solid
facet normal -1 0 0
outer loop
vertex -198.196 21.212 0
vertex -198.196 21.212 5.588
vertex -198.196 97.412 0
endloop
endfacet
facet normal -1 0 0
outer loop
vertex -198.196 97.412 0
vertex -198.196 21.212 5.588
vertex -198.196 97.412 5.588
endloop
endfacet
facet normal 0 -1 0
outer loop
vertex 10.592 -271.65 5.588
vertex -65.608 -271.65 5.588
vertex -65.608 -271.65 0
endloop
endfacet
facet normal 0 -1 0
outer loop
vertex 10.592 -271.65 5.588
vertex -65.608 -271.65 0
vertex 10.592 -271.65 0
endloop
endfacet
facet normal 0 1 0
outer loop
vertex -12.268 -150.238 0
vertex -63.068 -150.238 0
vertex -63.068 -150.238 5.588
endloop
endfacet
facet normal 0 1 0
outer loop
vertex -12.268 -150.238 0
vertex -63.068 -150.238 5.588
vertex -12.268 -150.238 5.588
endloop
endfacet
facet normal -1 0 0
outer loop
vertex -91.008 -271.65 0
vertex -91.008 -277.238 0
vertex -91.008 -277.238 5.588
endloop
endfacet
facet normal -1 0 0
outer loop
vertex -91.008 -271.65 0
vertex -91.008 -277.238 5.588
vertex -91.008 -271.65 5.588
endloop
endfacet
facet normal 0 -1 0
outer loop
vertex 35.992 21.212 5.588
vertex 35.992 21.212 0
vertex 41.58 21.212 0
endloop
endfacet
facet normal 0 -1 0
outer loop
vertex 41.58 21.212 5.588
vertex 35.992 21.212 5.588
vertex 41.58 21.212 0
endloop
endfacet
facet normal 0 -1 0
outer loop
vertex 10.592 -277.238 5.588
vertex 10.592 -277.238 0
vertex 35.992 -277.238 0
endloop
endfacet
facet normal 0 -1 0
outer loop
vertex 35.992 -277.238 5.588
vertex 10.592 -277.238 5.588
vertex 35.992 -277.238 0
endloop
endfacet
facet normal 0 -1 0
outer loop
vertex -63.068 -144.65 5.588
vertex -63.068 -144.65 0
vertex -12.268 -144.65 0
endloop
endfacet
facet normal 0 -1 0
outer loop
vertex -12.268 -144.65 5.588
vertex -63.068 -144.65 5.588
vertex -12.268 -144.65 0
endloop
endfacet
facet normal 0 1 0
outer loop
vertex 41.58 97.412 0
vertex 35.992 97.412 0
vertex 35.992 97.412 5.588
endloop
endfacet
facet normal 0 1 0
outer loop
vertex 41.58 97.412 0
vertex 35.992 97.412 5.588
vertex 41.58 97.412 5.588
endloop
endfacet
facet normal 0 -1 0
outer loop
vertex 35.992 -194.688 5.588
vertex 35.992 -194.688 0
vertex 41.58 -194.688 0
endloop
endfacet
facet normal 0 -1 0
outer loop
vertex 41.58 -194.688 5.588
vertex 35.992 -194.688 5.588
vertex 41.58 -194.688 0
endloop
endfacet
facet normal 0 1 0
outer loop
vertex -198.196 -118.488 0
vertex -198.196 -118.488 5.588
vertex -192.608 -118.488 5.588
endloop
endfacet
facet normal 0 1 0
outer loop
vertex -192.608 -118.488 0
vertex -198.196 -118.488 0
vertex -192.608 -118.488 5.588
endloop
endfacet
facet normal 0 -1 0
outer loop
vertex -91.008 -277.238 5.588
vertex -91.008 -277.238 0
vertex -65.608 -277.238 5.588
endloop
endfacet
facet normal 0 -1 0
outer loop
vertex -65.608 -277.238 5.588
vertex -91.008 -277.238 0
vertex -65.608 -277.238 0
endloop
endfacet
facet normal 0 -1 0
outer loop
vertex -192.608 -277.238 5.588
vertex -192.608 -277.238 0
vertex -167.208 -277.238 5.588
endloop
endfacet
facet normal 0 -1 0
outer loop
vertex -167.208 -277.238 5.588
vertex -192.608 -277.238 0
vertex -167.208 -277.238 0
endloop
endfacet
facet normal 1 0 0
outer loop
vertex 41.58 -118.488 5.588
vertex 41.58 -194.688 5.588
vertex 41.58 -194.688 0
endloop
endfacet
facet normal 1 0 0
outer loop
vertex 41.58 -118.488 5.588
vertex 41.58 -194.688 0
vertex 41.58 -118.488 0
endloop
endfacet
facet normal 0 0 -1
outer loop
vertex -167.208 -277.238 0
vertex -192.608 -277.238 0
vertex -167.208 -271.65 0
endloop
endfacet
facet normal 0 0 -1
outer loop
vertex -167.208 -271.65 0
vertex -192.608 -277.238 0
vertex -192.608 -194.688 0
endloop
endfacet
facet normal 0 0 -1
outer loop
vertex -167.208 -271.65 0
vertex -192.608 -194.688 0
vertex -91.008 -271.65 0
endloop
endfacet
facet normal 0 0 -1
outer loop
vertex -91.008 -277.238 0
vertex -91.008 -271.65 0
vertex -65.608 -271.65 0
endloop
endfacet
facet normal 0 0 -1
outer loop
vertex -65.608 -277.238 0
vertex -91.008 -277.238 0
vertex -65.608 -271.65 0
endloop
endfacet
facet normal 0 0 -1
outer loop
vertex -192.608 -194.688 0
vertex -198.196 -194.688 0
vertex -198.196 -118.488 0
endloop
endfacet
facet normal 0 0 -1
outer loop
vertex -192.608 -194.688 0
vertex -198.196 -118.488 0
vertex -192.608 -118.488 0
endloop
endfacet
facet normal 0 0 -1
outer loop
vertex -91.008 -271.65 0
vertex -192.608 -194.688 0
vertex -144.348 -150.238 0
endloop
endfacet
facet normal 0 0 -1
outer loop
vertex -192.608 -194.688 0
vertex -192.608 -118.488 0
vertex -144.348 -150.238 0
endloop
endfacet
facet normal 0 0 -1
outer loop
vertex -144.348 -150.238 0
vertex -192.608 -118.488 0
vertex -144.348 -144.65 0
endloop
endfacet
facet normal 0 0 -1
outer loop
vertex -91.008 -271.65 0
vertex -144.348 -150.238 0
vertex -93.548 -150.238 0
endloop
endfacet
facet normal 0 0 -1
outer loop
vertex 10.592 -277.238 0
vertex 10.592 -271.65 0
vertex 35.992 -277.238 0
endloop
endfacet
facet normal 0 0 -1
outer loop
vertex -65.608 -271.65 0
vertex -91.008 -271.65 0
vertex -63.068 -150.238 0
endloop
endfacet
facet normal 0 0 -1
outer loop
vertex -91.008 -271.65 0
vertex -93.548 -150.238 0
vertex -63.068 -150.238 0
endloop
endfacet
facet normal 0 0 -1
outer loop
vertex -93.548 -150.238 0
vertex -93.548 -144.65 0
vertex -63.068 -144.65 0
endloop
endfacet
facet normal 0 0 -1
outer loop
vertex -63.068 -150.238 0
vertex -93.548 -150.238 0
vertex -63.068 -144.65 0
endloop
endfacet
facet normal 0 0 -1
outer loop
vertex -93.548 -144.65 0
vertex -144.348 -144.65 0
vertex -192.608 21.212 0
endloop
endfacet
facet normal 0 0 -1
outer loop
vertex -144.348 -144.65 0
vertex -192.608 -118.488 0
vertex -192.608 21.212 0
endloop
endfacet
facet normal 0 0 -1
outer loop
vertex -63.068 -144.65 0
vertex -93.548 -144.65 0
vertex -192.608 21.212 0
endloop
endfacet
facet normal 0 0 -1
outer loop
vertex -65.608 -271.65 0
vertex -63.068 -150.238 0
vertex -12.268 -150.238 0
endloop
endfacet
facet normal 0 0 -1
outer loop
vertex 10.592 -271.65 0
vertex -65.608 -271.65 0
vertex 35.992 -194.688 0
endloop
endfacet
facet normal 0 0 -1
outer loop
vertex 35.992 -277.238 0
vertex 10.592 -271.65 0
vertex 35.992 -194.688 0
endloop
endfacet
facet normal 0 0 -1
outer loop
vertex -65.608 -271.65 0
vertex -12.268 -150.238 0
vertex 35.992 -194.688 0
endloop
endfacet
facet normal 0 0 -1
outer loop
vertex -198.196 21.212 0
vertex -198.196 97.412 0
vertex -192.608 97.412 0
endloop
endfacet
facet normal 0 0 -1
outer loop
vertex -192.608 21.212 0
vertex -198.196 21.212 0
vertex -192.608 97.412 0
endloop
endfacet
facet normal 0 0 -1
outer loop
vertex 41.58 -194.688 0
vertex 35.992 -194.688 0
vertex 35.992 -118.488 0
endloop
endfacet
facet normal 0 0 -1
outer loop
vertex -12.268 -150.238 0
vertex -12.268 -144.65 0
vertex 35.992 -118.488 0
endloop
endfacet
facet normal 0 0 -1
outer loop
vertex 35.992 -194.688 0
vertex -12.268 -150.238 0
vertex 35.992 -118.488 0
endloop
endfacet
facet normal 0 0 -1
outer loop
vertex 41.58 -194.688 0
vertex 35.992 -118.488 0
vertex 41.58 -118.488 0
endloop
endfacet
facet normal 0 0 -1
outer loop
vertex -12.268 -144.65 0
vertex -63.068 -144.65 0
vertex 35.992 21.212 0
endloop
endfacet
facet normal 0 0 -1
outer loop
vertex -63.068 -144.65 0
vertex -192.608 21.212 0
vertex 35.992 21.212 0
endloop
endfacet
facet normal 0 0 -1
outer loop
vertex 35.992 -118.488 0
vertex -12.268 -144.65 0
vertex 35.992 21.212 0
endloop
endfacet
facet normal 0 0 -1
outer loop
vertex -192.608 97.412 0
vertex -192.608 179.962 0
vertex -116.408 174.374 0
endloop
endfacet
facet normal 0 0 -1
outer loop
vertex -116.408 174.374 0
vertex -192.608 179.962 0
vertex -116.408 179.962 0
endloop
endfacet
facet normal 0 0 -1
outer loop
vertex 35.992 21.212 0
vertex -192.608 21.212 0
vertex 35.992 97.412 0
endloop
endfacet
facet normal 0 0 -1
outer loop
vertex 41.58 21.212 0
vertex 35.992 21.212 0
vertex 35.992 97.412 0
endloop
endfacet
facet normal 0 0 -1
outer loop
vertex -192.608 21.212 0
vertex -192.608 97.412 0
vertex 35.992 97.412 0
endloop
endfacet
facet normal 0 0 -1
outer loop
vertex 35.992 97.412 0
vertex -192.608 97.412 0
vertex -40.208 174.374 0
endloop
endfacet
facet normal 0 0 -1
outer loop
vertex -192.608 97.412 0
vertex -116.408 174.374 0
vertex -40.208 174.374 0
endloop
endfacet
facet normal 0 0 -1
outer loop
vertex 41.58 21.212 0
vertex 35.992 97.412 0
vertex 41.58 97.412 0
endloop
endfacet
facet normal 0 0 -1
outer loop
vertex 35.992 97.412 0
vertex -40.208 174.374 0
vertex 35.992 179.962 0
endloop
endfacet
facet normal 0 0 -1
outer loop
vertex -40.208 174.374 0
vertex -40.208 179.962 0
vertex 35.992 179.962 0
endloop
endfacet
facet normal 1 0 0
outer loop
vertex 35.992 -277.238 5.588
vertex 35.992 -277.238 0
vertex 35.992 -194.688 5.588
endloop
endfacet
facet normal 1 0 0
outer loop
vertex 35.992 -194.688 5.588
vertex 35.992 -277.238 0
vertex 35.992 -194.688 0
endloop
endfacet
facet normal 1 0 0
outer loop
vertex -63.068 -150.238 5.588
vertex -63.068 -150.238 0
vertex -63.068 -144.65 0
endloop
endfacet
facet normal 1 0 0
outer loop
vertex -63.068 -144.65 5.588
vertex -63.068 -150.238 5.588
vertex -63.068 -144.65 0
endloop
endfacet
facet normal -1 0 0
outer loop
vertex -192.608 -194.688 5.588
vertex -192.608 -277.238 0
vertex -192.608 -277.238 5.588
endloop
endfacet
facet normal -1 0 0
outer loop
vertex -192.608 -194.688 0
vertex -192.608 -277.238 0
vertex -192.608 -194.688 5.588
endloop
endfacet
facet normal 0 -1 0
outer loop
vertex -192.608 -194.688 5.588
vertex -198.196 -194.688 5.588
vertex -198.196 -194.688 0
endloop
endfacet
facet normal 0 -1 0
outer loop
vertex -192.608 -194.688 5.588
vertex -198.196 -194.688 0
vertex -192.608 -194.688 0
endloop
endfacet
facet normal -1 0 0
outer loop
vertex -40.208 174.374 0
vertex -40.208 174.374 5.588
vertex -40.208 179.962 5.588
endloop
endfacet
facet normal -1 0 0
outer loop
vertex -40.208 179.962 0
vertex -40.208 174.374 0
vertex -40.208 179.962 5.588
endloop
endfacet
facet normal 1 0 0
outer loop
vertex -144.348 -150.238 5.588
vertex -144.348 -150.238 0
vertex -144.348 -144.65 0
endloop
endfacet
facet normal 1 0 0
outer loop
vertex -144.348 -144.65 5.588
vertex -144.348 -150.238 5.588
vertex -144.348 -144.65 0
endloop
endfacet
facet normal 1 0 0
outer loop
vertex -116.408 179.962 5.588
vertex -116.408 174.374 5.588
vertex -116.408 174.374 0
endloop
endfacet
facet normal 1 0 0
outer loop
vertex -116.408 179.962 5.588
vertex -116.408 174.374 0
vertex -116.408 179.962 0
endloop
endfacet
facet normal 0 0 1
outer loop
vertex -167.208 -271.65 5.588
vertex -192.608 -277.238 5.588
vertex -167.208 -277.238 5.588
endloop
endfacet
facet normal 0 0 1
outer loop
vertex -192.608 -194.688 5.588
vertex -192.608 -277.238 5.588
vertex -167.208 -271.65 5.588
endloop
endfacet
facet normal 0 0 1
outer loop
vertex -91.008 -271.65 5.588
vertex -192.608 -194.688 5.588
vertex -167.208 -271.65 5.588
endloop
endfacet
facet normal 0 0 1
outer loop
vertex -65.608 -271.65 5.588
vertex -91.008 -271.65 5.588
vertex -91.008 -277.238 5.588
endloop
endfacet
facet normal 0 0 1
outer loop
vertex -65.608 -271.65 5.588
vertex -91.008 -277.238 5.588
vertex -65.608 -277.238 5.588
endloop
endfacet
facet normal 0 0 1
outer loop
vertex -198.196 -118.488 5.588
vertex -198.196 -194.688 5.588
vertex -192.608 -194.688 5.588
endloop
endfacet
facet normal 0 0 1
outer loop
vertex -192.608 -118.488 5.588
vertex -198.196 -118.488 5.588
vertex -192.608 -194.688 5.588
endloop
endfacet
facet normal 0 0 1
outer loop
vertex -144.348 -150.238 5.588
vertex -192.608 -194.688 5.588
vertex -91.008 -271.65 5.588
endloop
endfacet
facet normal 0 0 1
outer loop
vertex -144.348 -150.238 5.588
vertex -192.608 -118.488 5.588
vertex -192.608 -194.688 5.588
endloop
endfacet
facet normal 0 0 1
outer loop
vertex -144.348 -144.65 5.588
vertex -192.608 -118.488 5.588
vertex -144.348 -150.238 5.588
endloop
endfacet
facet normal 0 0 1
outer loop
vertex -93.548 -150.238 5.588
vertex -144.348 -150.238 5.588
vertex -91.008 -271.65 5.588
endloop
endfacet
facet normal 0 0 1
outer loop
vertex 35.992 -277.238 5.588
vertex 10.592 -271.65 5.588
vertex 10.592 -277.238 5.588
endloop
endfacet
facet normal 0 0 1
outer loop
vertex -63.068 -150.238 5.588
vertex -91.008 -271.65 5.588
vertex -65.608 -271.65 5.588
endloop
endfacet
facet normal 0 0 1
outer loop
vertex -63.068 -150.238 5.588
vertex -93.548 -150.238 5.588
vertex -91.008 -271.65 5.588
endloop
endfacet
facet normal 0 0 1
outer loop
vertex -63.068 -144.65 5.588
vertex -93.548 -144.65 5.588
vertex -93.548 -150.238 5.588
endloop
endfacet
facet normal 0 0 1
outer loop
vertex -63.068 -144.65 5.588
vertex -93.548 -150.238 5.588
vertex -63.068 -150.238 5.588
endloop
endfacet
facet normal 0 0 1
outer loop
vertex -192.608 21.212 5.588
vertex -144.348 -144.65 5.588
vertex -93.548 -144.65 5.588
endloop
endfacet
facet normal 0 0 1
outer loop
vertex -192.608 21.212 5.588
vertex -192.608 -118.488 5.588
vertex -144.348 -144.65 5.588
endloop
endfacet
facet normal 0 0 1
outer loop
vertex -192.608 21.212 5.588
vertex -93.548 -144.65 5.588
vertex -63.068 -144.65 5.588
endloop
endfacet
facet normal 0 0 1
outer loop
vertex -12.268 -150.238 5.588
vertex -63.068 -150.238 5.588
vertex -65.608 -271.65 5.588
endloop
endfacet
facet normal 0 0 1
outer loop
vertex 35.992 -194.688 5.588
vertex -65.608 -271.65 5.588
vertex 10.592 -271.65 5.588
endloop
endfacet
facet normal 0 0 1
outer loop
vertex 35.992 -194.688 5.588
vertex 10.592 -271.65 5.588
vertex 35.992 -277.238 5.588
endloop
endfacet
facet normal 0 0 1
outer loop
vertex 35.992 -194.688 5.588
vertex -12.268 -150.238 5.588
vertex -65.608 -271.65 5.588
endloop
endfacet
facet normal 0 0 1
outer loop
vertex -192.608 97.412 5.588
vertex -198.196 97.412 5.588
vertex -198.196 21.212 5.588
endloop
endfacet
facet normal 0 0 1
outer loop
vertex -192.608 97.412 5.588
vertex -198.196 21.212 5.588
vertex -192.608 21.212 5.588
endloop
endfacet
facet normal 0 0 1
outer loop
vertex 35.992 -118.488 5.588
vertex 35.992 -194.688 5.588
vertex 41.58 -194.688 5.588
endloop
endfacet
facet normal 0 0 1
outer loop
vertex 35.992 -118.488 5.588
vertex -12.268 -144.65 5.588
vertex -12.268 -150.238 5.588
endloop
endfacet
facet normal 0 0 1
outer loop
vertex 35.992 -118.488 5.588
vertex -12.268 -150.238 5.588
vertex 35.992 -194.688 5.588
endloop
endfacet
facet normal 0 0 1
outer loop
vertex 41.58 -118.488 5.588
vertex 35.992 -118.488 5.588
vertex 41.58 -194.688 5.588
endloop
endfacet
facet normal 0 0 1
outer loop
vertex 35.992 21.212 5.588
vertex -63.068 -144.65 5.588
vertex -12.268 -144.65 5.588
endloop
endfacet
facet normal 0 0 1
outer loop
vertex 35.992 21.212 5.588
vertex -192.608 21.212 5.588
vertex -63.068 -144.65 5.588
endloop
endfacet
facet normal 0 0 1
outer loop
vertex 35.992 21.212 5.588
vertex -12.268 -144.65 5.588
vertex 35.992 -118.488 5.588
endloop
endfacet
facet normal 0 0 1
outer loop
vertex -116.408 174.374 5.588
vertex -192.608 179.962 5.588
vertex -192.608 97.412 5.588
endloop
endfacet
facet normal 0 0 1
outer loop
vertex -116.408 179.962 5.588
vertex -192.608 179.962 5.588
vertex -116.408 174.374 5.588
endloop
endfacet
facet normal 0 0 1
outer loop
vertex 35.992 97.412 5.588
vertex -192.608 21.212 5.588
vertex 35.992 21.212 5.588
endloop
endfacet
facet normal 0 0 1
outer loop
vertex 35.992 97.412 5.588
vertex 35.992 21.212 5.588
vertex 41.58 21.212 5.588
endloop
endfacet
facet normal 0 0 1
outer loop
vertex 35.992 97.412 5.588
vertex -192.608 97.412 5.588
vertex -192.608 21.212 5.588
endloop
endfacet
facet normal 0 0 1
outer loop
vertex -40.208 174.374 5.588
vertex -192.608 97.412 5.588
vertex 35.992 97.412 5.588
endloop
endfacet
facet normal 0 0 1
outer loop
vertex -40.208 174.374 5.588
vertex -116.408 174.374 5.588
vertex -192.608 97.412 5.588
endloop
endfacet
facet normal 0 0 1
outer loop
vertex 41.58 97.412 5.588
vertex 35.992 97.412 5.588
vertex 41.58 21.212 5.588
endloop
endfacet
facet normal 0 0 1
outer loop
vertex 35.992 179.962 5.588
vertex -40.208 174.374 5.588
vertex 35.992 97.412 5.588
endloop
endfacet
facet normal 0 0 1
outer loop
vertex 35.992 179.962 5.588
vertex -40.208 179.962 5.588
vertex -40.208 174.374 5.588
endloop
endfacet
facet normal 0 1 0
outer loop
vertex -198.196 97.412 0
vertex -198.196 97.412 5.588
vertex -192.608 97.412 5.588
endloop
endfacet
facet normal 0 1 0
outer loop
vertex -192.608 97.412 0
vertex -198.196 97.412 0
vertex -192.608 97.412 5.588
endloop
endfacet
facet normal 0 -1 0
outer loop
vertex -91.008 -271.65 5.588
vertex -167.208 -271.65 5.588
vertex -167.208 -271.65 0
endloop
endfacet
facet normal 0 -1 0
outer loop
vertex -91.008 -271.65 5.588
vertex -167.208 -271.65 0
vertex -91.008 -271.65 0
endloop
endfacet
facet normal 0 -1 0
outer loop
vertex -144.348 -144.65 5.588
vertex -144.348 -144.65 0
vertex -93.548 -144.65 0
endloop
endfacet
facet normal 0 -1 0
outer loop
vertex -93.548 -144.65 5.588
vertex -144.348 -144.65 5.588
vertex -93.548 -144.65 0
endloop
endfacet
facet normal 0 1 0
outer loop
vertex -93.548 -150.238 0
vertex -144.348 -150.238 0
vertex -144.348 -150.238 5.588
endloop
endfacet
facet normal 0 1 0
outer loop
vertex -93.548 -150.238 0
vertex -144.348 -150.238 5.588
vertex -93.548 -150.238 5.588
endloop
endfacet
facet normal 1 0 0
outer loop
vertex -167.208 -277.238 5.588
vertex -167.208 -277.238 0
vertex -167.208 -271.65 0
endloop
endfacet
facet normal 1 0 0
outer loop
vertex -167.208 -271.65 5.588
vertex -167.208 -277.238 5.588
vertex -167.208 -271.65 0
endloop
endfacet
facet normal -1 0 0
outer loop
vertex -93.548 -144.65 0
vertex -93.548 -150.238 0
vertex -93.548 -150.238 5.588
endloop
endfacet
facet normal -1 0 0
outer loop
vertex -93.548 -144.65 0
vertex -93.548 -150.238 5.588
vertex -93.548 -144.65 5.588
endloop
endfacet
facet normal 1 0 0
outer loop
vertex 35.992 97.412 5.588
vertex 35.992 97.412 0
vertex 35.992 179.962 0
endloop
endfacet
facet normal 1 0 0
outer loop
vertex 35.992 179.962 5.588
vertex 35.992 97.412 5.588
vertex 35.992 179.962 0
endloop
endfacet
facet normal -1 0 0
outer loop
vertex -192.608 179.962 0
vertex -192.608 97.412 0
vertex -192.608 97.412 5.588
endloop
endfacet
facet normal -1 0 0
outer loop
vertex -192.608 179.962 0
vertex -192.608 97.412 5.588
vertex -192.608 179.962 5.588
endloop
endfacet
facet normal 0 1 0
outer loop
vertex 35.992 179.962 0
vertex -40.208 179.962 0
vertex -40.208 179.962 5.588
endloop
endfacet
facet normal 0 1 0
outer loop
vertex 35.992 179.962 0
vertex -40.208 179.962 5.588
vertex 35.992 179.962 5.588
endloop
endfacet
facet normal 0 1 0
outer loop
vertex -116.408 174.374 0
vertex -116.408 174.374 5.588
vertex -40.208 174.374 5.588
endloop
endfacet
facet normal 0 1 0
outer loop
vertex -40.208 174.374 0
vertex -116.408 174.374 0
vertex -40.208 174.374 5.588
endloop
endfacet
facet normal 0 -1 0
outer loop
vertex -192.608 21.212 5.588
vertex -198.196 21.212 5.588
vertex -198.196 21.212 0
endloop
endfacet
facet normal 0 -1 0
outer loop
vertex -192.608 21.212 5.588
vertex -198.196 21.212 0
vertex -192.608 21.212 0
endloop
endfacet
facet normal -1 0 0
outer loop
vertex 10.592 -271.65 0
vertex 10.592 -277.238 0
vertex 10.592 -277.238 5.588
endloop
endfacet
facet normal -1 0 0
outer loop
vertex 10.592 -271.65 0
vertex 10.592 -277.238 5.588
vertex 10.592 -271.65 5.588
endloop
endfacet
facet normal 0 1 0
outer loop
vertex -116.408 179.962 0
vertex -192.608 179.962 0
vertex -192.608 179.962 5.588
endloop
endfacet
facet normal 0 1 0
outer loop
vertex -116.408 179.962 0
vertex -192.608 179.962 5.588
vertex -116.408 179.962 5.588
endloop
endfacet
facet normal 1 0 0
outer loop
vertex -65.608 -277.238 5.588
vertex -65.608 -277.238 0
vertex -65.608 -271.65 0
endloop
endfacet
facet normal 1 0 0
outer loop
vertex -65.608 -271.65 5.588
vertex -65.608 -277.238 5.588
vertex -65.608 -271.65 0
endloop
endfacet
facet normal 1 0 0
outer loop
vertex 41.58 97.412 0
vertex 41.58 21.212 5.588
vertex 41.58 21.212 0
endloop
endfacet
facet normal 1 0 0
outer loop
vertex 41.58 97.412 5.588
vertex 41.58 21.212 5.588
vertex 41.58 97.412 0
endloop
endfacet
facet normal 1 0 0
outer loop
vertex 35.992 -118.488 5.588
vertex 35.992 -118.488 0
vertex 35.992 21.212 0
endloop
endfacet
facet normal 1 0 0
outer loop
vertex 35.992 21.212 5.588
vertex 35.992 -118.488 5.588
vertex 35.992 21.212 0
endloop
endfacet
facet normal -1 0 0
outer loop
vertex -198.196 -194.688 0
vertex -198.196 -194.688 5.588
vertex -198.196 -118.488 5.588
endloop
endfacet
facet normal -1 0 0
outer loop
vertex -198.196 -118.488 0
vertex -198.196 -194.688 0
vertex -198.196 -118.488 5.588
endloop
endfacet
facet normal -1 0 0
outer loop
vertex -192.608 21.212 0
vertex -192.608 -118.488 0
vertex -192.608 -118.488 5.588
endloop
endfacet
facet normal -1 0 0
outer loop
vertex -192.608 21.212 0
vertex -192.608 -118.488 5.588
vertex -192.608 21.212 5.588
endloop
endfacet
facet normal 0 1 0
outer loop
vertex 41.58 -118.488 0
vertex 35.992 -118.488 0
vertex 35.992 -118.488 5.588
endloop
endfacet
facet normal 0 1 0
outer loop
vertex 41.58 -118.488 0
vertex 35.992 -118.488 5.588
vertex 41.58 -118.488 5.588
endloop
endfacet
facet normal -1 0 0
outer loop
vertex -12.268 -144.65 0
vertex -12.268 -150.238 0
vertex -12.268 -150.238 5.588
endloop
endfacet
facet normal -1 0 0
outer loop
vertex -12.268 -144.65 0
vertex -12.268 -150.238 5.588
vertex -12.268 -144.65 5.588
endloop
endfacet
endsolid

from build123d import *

# Parameters (mm, degrees)
SKETCH1_W               = 228.6
SKETCH1_H               = 457.2
BOSS_EXTRUDE1_DEPTH     = 5.588
SKETCH2_W               = 5.588
SKETCH2_H               = 76.2
BOSS_EXTRUDE4_DEPTH     = 5.588
SKETCH3_W               = 76.2
SKETCH3_H               = 5.588
CUT_EXTRUDE1_DEPTH      = 5.588
CUT_EXTRUDE5_DEPTH      = 341.842806914
CUT_EXTRUDE5_DEPTH_BACK = 341.842806914
SKETCH4_W               = 50.8
SKETCH4_H               = 5.588


with BuildPart() as part:
    # Sketch1 → Boss-Extrude1 (new body)
    with BuildSketch(Plane.XY):
        with Locations((-78.307659574, -48.638297872)):
            Rectangle(SKETCH1_W, SKETCH1_H)
    extrude(amount=BOSS_EXTRUDE1_DEPTH)

    # Sketch2 → Boss-Extrude4 (add, through all)
    with BuildSketch(Plane.XY.offset(5.588)):
        with Locations((-195.401659574, 59.311702128)):
            Rectangle(SKETCH2_W, SKETCH2_H)
        with Locations((-195.401659574, -156.588297872)):
            Rectangle(SKETCH2_W, SKETCH2_H)
        with Locations((38.786340426, -156.588297872)):
            Rectangle(SKETCH2_W, SKETCH2_H)
        with Locations((38.786340426, 59.311702128)):
            Rectangle(SKETCH2_W, SKETCH2_H)
    extrude(amount=-BOSS_EXTRUDE4_DEPTH)

    # Sketch3 → Cut-Extrude1 (cut)
    with BuildSketch(Plane.XY.offset(5.588)):
        with Locations((-129.107659574, -274.444297872)):
            Rectangle(SKETCH3_W, SKETCH3_H)
        with Locations((-27.507659574, -274.444297872)):
            Rectangle(SKETCH3_W, SKETCH3_H)
        with Locations((-78.307659574, 177.167702128)):
            Rectangle(SKETCH3_W, SKETCH3_H)
    extrude(amount=-CUT_EXTRUDE1_DEPTH, mode=Mode.SUBTRACT)

    # Sketch4 → Cut-Extrude5 (cut, two sides: drawn at the far end of the back side and taken through both)
    with BuildSketch(Plane.XY.offset(-CUT_EXTRUDE5_DEPTH_BACK)):
        with Locations((-118.947659574, -147.444297872)):
            Rectangle(SKETCH4_W, SKETCH4_H)
        with Locations((-37.667659574, -147.444297872)):
            Rectangle(SKETCH4_W, SKETCH4_H)
    extrude(amount=CUT_EXTRUDE5_DEPTH + CUT_EXTRUDE5_DEPTH_BACK, mode=Mode.SUBTRACT)


solid = part.part
